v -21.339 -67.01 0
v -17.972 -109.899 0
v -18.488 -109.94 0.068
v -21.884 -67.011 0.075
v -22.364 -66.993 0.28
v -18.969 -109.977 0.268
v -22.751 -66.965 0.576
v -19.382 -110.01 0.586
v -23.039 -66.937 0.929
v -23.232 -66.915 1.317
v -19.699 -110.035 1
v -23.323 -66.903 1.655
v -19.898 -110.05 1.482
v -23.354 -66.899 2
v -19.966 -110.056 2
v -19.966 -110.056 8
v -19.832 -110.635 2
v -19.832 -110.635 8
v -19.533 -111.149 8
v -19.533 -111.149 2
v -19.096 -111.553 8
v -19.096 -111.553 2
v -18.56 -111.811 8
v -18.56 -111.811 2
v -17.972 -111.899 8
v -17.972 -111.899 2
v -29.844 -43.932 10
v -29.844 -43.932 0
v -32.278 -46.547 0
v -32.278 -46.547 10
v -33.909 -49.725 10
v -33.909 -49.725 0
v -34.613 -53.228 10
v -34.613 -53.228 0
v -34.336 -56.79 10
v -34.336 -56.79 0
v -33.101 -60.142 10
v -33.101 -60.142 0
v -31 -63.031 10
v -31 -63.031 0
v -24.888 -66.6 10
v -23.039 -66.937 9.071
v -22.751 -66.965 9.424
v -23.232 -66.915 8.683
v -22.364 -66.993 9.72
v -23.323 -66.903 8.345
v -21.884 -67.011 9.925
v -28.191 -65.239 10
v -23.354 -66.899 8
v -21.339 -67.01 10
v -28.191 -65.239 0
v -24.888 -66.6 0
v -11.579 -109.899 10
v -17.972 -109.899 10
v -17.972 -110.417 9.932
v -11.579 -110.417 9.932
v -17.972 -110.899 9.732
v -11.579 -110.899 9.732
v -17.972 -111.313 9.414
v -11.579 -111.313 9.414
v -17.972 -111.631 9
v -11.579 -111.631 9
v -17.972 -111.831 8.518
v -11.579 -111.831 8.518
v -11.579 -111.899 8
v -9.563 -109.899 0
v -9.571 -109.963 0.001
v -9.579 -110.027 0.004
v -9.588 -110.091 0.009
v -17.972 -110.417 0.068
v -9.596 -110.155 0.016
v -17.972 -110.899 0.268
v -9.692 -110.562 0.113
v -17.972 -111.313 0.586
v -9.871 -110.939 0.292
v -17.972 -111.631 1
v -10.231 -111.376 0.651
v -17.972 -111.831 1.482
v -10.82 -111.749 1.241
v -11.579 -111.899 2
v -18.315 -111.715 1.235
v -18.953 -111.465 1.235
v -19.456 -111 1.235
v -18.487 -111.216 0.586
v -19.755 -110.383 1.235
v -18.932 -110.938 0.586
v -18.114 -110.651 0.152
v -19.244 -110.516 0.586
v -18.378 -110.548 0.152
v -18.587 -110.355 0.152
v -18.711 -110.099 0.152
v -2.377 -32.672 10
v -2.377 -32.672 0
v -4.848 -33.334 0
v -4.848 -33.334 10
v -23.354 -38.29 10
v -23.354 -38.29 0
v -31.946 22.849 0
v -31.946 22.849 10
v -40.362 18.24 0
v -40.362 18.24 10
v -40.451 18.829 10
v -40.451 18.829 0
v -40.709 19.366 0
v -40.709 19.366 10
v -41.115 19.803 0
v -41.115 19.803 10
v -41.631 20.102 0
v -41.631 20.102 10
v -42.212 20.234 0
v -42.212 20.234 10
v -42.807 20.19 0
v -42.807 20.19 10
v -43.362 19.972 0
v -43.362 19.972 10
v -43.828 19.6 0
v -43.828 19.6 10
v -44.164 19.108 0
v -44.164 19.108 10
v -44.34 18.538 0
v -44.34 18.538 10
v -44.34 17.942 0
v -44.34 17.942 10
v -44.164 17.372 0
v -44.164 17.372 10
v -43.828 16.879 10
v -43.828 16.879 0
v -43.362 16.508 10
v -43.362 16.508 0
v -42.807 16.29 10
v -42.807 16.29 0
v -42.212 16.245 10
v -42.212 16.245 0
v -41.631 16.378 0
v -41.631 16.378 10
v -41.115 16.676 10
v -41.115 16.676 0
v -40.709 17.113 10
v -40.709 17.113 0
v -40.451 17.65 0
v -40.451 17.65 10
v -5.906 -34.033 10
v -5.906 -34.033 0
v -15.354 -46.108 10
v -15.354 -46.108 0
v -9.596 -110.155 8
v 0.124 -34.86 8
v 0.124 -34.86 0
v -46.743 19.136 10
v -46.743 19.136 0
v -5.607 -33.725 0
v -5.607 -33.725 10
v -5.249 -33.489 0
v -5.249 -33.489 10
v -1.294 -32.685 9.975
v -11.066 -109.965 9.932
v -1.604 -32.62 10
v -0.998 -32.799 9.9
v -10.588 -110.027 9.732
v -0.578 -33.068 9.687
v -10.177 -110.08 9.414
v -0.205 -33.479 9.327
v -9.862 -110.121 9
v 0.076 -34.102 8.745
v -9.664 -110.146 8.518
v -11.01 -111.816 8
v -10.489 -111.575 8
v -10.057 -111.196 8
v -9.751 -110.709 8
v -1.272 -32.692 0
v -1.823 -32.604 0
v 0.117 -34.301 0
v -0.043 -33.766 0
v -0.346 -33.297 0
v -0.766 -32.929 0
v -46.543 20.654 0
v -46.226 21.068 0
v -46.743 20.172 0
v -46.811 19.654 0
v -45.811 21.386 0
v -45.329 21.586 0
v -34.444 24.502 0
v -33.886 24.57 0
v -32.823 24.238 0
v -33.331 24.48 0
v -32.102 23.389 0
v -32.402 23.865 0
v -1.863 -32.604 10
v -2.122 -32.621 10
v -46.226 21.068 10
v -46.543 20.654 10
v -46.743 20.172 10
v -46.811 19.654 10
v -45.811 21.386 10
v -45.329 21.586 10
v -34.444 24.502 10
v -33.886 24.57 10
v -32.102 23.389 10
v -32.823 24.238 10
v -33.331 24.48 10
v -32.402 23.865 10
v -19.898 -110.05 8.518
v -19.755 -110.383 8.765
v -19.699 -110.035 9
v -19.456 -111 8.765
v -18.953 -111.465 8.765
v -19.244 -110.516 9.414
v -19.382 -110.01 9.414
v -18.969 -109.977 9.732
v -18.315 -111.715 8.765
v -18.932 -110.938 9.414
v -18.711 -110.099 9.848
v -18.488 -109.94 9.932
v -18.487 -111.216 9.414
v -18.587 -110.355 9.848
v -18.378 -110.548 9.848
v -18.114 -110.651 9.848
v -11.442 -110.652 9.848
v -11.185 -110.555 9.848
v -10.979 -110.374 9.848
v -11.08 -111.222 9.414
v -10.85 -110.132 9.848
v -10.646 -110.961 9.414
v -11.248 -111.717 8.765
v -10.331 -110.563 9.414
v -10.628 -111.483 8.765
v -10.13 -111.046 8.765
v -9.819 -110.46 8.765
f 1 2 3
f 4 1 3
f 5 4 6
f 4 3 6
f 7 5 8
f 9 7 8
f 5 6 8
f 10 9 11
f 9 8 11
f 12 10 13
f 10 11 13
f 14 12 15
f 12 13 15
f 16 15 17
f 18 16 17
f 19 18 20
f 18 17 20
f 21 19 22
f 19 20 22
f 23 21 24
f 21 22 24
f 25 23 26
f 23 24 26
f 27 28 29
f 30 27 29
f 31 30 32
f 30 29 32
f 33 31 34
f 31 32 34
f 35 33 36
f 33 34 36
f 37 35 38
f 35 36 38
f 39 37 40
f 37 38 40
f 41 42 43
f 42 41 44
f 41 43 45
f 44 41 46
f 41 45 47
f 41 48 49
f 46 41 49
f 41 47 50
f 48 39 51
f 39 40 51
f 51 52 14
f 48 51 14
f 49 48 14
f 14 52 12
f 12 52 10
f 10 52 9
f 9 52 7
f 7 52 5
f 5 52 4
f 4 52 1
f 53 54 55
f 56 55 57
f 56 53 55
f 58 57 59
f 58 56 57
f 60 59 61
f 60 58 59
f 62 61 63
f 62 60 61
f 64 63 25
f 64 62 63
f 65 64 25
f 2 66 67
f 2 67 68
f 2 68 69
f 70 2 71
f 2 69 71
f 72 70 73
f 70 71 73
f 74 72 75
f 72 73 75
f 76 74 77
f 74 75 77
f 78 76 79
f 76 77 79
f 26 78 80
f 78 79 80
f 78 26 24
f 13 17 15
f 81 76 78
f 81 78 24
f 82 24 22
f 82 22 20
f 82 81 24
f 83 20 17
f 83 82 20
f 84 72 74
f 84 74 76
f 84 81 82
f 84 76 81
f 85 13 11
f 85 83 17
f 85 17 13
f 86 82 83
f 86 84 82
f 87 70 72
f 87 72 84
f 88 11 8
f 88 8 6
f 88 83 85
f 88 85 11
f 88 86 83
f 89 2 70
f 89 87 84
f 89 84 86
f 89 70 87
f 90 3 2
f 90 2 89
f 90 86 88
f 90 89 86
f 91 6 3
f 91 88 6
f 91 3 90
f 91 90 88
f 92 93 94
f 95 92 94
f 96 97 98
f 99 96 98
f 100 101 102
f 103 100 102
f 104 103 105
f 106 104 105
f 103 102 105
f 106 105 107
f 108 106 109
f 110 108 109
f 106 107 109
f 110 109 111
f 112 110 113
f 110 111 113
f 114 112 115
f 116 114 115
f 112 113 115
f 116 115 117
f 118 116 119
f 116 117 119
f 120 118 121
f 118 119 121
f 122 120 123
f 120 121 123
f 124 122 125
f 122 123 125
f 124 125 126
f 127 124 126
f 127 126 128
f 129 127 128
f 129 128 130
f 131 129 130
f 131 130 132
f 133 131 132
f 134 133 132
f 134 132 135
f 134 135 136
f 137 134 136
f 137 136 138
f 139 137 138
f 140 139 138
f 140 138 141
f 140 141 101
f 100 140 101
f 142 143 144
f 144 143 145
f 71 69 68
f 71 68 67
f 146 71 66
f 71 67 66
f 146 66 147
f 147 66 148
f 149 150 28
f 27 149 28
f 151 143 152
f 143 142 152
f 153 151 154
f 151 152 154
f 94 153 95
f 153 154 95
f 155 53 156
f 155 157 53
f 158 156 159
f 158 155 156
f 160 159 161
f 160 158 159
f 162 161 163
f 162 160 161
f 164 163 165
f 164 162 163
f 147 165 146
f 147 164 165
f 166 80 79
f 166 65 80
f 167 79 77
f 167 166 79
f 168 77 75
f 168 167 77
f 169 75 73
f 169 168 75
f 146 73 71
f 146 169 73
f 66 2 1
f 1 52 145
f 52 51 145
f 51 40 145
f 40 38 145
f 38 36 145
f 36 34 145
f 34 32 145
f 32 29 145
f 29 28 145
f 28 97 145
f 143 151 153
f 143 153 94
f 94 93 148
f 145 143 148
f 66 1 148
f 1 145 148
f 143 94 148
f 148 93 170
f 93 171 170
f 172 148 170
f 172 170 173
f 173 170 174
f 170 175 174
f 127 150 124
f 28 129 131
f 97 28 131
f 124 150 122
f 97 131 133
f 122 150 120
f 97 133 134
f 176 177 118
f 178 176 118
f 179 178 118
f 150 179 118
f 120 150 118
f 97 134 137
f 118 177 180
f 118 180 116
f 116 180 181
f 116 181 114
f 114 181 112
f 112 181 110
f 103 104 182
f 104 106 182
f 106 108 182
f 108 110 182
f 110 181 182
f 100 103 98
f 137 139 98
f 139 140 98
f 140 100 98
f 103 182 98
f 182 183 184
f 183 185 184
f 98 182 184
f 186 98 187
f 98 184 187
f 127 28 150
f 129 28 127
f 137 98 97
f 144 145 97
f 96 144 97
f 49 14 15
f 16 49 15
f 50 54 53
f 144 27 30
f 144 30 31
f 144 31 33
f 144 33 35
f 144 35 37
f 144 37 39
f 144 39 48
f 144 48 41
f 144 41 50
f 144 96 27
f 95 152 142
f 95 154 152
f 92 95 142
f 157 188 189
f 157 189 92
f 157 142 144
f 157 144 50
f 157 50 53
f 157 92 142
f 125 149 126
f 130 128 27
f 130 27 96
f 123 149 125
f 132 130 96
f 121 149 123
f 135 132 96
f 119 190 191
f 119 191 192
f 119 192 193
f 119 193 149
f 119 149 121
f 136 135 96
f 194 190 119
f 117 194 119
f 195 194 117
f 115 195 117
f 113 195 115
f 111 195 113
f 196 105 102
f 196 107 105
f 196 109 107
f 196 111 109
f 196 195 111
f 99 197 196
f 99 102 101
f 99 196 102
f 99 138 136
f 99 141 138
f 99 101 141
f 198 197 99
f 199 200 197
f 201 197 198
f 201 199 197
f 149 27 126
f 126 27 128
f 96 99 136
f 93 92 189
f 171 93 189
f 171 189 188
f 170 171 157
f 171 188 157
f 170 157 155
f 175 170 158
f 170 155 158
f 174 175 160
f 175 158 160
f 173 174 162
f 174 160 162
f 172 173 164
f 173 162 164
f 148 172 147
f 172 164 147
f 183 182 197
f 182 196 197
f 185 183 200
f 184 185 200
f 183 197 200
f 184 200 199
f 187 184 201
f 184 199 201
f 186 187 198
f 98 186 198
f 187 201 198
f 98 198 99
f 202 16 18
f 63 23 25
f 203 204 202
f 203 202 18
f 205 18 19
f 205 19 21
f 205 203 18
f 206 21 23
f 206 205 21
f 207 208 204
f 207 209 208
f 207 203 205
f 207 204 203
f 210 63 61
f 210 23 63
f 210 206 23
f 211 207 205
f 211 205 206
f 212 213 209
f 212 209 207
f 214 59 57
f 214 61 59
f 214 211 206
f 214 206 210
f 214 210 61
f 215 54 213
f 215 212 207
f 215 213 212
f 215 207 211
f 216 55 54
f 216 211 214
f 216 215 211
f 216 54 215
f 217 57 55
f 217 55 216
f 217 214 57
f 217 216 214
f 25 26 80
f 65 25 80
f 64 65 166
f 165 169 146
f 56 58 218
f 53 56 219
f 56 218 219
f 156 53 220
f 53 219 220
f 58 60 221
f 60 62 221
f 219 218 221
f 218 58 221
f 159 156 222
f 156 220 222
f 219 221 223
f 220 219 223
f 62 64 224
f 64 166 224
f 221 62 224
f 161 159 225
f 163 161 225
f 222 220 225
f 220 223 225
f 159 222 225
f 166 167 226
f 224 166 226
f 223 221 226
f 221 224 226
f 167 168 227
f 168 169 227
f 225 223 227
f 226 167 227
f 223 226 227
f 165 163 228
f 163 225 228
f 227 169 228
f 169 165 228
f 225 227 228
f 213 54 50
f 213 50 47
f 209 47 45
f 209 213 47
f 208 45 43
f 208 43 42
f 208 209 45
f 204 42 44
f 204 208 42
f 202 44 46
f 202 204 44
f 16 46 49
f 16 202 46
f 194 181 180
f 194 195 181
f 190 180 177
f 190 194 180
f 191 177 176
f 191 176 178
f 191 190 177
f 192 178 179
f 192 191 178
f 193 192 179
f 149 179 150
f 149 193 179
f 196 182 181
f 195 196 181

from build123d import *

# Parameters (mm, degrees)
BOSS_EXTRUDE1_DEPTH = 10
SKETCH5_R           = 2
CUT_EXTRUDE1_DEPTH  = 122.881115044
FILLET3_R           = 2
FILLET4_R           = 2


with BuildPart() as part:
    # Sketch3 → Boss-Extrude1 (new body)
    with BuildSketch(Plane.XY):
        with BuildLine():
            Line((-32.260936358, 25.087487365), (-47.260936358, 21.068249478))
            Line((-47.260936358, 21.068249478), (-29.84423885, -43.931750522))
            ThreePointArc((-29.84423885, -43.931750522), (-34.146547057, -57.548288053), (-23.353857896, -66.899106783))
            Line((-23.353857896, -66.899106783), (-19.821063106, -111.899106783))
            Line((-19.821063106, -111.899106783), (-9.821063106, -111.899106783))
            Line((-9.821063106, -111.899106783), (0.506029252, -31.899106783))
            Line((0.506029252, -31.899106783), (-5.493970748, -33.506801938))
            Line((-5.493970748, -33.506801938), (-15.353857896, -46.107699741))
            Line((-15.353857896, -46.107699741), (-23.353857896, -38.289669035))
            Line((-23.353857896, -38.289669035), (-32.260936358, 25.087487365))
        make_face()
    extrude(amount=BOSS_EXTRUDE1_DEPTH)

    # Sketch5 → Cut-Extrude1 (cut, through all)
    with BuildSketch(Plane.XY.offset(10)):
        with Locations((-42.361956872, 18.239822354)):
            Circle(SKETCH5_R)
    extrude(amount=-CUT_EXTRUDE1_DEPTH, mode=Mode.SUBTRACT)

    # Fillet3
    fillet3_edges = [part.edges().sort_by_distance(p)[0] for p in [
        (-14.821063106, -111.899106783, 0),
        (-21.587460501, -89.399106783, 0),
        (-5.493970748, -33.506801938, 5),
        (0.506029252, -31.899106783, 5),
        (-9.821063106, -111.899106783, 5),
        (-47.260936358, 21.068249478, 5),
        (-32.260936358, 25.087487365, 5),
        (-21.587460501, -89.399106783, 10),
        (-14.821063106, -111.899106783, 10),
        (-4.657516927, -71.899106783, 10),
    ]]
    fillet(fillet3_edges, radius=FILLET3_R)

    # Fillet4
    # the kernel refuses this fillet: 2 mm, written as the material it takes off along each edge
    with BuildSketch(Plane(origin=(-17.971922396, -109.899106783, 2), x_dir=(0, -1, 0), z_dir=(0, 0, -1))) as fillet4_piece_1_section:
        Polygon((0, 0), (FILLET4_R, 0), (FILLET4_R, FILLET4_R * 0.924570354696), (FILLET4_R * 0.0782657346199, FILLET4_R * 0.996932532714), align=None)
    fillet4_piece_1 = extrude(amount=FILLET4_R, mode=Mode.PRIVATE)
    fillet4_piece_1 = fillet4_piece_1 - Plane(origin=(-17.971922396, -109.899106783, 2), x_dir=(0.6788719560344534, 0.7342566767214005, 0), z_dir=(0, 0, -1)) * Sphere(FILLET4_R, mode=Mode.PRIVATE)
    add(fillet4_piece_1, mode=Mode.SUBTRACT)
    with BuildSketch(Plane(origin=(-17.971922396, -109.899106783, 8), x_dir=(0, -1, 0), z_dir=(0, 0, 1))) as fillet4_piece_2_section:
        Polygon((0, 0), (FILLET4_R, 0), (FILLET4_R, -FILLET4_R * 0.924570354696), (FILLET4_R * 0.0782657346199, -FILLET4_R * 0.996932532714), align=None)
    fillet4_piece_2 = extrude(amount=FILLET4_R, mode=Mode.PRIVATE)
    fillet4_piece_2 = fillet4_piece_2 - Plane(origin=(-17.971922396, -109.899106783, 8), x_dir=(0.6788719560344534, 0.7342566767214005, 0), z_dir=(0, 0, 1)) * Sphere(FILLET4_R, mode=Mode.PRIVATE)
    add(fillet4_piece_2, mode=Mode.SUBTRACT)
    with BuildSketch(Plane(origin=(-19.821063106, -111.899106783, 2), x_dir=(1, 0, 0), z_dir=(0, 0, 1))) as fillet4_piece_3:
        with BuildLine():
            CenterArc((FILLET4_R * 0.924570354696, FILLET4_R), FILLET4_R, 184.488887052, 85.511112948)
            Line((-FILLET4_R * 0.0723621780181, FILLET4_R * 0.92173426538), (0, 0))
            Line((0, 0), (FILLET4_R * 0.924570354696, 0))
        make_face()
    extrude(amount=6, mode=Mode.SUBTRACT)


solid = part.part
